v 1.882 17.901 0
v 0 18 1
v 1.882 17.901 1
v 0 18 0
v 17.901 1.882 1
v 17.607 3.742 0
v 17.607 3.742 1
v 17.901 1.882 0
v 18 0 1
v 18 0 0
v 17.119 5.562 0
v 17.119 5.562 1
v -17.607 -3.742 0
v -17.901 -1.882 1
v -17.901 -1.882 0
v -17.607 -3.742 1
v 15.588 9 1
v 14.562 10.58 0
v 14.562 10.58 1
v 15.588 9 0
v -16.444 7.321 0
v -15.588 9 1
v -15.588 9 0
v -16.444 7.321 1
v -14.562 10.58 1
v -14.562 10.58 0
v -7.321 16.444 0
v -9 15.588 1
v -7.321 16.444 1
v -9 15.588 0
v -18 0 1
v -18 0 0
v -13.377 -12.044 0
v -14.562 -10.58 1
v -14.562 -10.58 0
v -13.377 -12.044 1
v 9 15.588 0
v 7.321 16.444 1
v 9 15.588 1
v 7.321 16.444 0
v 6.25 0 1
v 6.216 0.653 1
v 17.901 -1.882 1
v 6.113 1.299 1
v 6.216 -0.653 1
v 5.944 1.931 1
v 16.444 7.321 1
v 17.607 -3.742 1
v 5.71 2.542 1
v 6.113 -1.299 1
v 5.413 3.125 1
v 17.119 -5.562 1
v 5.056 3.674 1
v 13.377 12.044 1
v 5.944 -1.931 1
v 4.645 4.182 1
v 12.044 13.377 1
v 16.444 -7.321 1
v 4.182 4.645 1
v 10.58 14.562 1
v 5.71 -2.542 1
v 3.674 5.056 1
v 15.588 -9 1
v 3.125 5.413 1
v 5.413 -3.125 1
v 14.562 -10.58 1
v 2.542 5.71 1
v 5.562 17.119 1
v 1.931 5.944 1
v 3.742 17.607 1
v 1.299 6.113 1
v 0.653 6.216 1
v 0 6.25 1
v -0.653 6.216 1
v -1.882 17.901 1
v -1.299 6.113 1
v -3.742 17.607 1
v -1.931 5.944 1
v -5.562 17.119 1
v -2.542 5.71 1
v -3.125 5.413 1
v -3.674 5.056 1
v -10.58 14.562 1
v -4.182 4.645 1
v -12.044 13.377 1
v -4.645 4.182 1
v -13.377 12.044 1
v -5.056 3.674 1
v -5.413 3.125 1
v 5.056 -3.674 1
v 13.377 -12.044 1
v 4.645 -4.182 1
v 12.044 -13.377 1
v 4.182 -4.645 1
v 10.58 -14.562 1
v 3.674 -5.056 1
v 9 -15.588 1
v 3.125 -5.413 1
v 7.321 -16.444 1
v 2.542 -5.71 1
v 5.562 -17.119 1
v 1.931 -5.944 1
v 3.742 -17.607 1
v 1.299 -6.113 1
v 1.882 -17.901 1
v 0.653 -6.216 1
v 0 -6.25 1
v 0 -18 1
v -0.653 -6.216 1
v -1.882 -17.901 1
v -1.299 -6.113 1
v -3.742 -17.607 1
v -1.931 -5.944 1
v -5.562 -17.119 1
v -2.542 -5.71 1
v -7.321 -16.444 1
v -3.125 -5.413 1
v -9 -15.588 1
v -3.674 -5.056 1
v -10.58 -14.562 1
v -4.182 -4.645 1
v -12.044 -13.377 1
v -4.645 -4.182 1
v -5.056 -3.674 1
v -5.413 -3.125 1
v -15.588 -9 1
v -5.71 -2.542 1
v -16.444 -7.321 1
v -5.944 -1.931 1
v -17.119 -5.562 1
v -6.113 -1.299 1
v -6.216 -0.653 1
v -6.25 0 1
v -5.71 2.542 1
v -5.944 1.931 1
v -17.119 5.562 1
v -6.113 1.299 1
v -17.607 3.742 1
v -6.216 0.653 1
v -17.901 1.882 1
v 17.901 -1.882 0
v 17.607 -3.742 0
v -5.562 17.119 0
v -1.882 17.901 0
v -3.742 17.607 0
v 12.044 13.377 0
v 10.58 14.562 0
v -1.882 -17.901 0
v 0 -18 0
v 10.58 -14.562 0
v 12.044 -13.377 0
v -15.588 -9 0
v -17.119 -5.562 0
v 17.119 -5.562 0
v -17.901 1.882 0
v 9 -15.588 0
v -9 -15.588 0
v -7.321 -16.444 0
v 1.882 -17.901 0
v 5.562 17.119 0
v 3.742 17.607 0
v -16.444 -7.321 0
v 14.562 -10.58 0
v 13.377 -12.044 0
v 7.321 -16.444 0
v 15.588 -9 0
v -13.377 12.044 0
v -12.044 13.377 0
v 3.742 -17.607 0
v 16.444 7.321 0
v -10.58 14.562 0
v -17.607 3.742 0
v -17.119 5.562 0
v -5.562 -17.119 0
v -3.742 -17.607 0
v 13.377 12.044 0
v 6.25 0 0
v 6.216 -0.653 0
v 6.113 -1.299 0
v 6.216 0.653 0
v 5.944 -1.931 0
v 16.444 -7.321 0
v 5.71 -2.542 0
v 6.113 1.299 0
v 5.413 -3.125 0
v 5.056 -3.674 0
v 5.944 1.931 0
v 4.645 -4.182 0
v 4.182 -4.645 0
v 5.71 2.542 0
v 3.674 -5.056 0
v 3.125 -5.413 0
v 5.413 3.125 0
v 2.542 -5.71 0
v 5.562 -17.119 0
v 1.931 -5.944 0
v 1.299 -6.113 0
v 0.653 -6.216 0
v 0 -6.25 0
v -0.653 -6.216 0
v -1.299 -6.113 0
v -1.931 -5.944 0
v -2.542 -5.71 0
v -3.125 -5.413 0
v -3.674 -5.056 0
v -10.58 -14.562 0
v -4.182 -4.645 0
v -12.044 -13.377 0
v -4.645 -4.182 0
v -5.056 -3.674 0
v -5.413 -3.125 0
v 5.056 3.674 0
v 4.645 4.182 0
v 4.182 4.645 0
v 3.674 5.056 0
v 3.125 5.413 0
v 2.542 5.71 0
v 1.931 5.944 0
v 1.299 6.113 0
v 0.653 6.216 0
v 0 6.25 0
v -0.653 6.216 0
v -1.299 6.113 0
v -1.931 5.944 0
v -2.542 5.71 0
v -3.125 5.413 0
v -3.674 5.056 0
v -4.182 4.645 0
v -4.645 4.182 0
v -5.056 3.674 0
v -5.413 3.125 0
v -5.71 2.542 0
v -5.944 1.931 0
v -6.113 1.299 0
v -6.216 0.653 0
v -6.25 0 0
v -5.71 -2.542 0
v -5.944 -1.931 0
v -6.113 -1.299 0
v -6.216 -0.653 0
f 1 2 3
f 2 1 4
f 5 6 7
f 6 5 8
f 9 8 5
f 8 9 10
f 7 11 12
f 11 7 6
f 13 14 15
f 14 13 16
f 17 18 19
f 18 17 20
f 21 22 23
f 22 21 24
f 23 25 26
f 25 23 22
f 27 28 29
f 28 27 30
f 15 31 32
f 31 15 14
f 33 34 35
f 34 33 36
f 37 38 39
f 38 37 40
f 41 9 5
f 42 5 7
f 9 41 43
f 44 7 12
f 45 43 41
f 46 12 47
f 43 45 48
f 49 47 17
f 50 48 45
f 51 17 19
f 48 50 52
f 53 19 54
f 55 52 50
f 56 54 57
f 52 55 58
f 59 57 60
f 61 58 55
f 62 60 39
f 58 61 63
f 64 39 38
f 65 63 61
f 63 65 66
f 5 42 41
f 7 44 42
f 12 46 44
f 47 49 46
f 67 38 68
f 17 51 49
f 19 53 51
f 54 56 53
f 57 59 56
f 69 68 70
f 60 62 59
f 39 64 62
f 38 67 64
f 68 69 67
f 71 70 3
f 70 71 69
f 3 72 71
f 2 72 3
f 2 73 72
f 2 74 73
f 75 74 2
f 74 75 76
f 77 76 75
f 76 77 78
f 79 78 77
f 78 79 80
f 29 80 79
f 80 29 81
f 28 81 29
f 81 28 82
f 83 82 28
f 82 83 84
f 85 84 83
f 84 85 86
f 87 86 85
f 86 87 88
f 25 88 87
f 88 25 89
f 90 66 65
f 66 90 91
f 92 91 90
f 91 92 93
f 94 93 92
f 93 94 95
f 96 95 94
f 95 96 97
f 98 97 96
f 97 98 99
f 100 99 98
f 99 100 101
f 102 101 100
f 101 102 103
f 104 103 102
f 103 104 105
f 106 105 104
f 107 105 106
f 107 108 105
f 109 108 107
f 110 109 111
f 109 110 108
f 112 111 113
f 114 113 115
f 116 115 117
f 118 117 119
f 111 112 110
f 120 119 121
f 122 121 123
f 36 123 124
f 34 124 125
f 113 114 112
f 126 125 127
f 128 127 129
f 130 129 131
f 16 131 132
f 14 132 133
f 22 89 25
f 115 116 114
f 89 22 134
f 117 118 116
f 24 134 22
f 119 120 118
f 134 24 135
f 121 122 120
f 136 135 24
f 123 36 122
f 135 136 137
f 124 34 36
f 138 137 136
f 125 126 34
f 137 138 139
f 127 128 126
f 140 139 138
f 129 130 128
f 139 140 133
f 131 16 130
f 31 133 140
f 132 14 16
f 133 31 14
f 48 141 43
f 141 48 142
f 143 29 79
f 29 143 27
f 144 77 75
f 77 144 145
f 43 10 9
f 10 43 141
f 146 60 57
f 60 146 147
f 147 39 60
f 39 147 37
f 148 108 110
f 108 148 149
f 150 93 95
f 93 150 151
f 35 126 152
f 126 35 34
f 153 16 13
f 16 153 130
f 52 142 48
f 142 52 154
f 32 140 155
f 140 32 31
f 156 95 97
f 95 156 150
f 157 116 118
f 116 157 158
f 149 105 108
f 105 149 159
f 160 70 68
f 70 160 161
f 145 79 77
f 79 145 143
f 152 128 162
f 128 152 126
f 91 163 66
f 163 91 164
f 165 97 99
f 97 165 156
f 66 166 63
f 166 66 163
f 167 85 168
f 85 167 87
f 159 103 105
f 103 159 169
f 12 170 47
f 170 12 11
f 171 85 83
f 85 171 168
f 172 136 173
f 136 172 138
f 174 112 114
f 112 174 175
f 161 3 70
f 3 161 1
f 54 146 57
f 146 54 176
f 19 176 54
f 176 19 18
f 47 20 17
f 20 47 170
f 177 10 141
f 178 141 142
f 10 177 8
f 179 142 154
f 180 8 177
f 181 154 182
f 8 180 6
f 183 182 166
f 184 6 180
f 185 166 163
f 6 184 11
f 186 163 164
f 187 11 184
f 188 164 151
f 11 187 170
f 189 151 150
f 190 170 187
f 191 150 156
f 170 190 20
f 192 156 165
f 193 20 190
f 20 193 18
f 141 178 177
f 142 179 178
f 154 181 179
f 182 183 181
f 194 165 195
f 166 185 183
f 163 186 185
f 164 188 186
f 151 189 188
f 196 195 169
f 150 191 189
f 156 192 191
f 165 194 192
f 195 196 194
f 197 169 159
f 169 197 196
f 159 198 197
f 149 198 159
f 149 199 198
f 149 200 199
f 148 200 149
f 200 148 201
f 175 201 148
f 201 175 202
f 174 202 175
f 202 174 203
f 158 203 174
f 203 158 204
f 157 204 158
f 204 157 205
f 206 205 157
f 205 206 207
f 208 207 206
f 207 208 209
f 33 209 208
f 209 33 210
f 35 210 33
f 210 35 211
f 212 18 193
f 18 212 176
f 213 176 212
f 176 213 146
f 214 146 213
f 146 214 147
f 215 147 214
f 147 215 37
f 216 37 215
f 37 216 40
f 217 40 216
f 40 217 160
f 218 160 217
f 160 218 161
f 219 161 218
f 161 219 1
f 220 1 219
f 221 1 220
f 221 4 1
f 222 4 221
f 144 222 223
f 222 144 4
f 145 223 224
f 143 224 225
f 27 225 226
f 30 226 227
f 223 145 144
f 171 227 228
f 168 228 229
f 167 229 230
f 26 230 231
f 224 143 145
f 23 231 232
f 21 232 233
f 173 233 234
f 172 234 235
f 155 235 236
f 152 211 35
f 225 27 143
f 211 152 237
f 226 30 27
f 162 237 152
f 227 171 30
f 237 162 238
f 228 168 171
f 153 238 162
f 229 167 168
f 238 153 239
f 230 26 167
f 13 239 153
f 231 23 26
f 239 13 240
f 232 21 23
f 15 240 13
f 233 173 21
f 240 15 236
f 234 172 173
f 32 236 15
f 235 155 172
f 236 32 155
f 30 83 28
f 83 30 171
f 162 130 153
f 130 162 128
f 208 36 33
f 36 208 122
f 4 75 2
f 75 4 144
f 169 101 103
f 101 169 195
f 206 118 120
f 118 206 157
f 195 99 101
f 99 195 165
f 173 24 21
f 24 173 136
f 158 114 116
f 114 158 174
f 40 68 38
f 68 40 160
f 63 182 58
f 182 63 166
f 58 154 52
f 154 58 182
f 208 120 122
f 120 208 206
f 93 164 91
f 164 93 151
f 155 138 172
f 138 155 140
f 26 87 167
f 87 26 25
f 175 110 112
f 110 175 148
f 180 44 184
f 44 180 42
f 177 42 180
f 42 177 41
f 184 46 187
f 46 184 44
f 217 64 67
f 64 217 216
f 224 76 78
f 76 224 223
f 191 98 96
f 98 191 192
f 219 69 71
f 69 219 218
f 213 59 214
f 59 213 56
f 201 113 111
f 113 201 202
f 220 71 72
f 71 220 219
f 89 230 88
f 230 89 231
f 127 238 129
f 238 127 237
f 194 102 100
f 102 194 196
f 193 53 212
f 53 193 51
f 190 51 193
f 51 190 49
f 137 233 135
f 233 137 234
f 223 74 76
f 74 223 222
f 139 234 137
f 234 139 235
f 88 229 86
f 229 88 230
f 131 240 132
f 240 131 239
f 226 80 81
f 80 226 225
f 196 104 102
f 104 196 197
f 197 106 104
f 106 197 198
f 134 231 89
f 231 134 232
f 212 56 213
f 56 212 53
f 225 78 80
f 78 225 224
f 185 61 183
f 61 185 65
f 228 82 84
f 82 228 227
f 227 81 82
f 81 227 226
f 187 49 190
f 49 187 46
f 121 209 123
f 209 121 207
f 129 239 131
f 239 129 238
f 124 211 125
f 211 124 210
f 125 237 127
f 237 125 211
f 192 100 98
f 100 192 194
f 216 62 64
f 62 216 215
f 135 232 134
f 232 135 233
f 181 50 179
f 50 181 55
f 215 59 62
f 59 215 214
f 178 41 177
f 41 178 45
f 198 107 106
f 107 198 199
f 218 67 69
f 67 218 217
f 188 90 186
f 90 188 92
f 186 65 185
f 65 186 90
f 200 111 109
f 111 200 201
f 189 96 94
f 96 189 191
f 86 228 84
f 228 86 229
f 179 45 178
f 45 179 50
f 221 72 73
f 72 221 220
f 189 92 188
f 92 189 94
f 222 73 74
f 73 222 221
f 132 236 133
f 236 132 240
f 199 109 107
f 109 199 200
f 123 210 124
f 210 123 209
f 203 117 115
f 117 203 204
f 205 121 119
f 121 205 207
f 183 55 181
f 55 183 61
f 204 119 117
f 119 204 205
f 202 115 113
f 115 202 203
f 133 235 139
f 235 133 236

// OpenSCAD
// file: _params.scad
// =========================================================================
// 공유 파라미터 (모든 개별 부품 파일에서 include)
// 메인 어셈블리: cup_z_x_catrage_frame_water_mic_anti_3030.scad 에서 추출
// 프레임: 600 × 420 × 700mm (3030 프로파일, Y=0 대칭)
// =========================================================================

$fn = 60;  // 부품 출력용 고해상도
GLOBAL_TOLERANCE = 0.2;

// --- [1] 하부 기성품 및 원통 파라미터 ---
X_RAIL_LEN = 290.0;
X_BLOCK_W = 30.0; X_BLOCK_L = 32.0;   // 신규 X슬라이더 블록 (폭 30mm × 길이 32mm)
X_PITCH_X = 20.0; X_PITCH_Y = 20.0;   // 체결 홀 피치 (20 × 20mm, M3 나사탭 4개)
X_RAIL_W = 30.0;  X_RAIL_H = 20.0;   // 레일 폭 30mm (레일 바닥~블록 윗면 높이 29mm 반영)
X_TOTAL_H = 29.0;                    // 레일 바닥에서 슬라이더 블록 윗면까지의 높이

MOTOR_W = 42.0;      MOTOR_PITCH = 31.0; MOTOR_HOLE_D = 3.5;    
MOTOR_BOSS_D = 22.0; MOTOR_BOSS_H = 2.0; SCREW_D = 8.0;         
MOT_BODY_L = 41.0;   SHAFT_L = 24.0;     // 실측 NEMA17 몸통 41mm / 축 돌출 24mm

CUP_ID = 99.5;  CUP_WALL = 5.0; CUP_OD = 110.0;     // 아크릴 원통 OD110/ID100
CUP_H = 180.0;   CAGE_H = 60.0;  FLOOR_H = 10.0; PISTON_H = 20.0;     

LIP_D = 30.0;    LIP_H = 5.0;    LEAK_DRAIN_D = 4.0;    
GUIDE_PIPE_D = 8.0; BUSHING_OD = 12.0; BUSHING_H = 8.0;       
DRAIN_RADIUS = 35.0; DRAIN_D = 8.0;        

Y_OFFSET = 85.0; BRKT_H = 12.0; BRKT_D = 122.0; BRKT_ID = 62.0; Z_MOUNT_PCD = 86.0;   

// --- [2] 아크릴 파이프 및 상부 카트리지 ---
ACRYL_ID = 100.0; ACRYL_T = 5.0; ACRYL_OD = ACRYL_ID + (ACRYL_T * 2);  // OD110 (아크릴집 106 재고없음 → 컵과 동일 규격)

REVOLVER_PCD = 240.0;     // 인접 카트리지 웹 9.8mm 확보 (OD110 대응, 230→240)
CARTRIDGE_OD = REVOLVER_PCD + ACRYL_OD + 8; 
TOP_PLATE_H = 15.0;       // 아크릴 15T 통판 (보스홀 단 깊이 10mm)

HUB_D = 60.0;            
SHAFT_D = 12.0;          
HUB_WALL = 4.0;          
HUB_H = 15.0;             // 아크릴 5T × 3장 적층 — 파이프 130mm 대응
POCKET_DEPTH = 5.0;
MID_HUB_Z = 63.5;          // 중단 허브 하면 Z (벨트 중심 Z=71.0mm 정렬, 풀리 상단 Z=75.0mm = 축상단-1mm)
UPPER_HUB_Z = 135.0;       // 상단 허브 하면 Z (전체 135+15=150 유지)
BOSS_OD = 35.0;
BOSS_H = 11.0;             // 보스11 + 와셔1 = 12, 리세스10 → 허브 2mm 공중

// --- [3] GT2 벨트 구동 시스템 ---
GT2_PITCH     = 2.0;
GT2_BELT_W    = 6.0;
BIG_PULLEY_TEETH = 566;
BIG_PULLEY_PD = BIG_PULLEY_TEETH * GT2_PITCH / PI;
BIG_PULLEY_OD = BIG_PULLEY_PD + 1.0;
SMALL_PULLEY_TEETH = 20;
SMALL_PULLEY_PD = SMALL_PULLEY_TEETH * GT2_PITCH / PI;
SMALL_PULLEY_OD = SMALL_PULLEY_PD + 1.0;

BELT_MOTOR_X = -300;
BELT_MOTOR_Y = -155.5;
BRKT_MOTOR_H = 25.0;
BRKT_MOTOR_W = 45.0;        // 브래킷 폭 45mm (프로파일 간섭 회피 복원)
SLOT_LEN = 10.0;
FLAG_W = 15.0;  FLAG_H = 8.0;  FLAG_T = 1.5;

X_POS_MEASURE = 170.0;   // 측정 브래킷 X좌표 (X_M~X_R 정중앙, X대칭)

// --- [4] 3030 프레임 경계 (600×430×700mm) ---
PF = 30;             // 3030 알루미늄 프로파일
WASHER_T = 1.0;     

X_L = -320;
X_M = 60;
X_R = 250;
Y_F = -210;          // 전방 (대칭: -210+30=-180, Y=0 중심)
Y_B = 180;           // 후방 (대칭: 180+30=210, Y=0 중심) — 메인파일과 동기화

Z_BOT = -480;
Z_RAIL = -322;
Z_MID = -TOP_PLATE_H - PF;
Z_TOP = 220;

SUPPORT_PILLAR_H = Z_TOP - PF;

SHAFT_SQ = 20;       // 2020 사각 회전축

// 사각 축 홀 크기
SQ = SHAFT_SQ + GLOBAL_TOLERANCE;  // 20.2mm

// --- 리볼버/컵 축 정렬 (보스홀=판 중심에 리볼버 정렬) ---
REVOLVER_CX = (X_L + X_M + PF)/2;        // 판 중심 = 보스홀 = 리볼버 회전축 (-115)
DROP_X      = REVOLVER_CX + REVOLVER_PCD/2;  // 링 드롭 / 컵 적재 축 (+5)

FLANGE_Z = 52.0;       // 모터 전면 안착 높이 (Z=52mm -> 축 상단 Z=76mm, 풀리 결합)

// --- [5] 모터 체결홀 (이미 제작 완료된 15T 상판 원본 도면 수치 100% 유지) ---
MOTOR_BOLT_PITCH     = 25.0;      // Y피치 (Y = ±12.5mm)
MOTOR_BOLT_X_NOMINAL = X_L + 55;  // 1열: 상판 좌단 55 (모터축 기준 +35mm = X=-265mm)
MOTOR_BOLT_X_SHIFT   = X_L + 40;  // 2열: 상판 좌단 40 (모터축 기준 +20mm = X=-280mm)

// 모터 마운트 볼트 카운터보어 (단볼트용 — 브래킷 두께 25 중 깊게 파냄)
MOTOR_CB_D     = 6.5;            // M3 캡볼트 머리 클리어런스
MOTOR_CB_DEPTH = 19;             // 카운터보어 깊이 (잔여 통과 6mm → M3×10 단볼트)
// main file
// =========================================================================
// [구매] 테플론(PTFE) 와셔
// 구매: PTFE 와셔 OD36 × ID(SHAFT_D+0.5) × T1mm
// 하단 허브 보스 아래, 상판 단 바닥에 매립 (저마찰 베어링)
// 보스(9.3) + 와셔(1) = 10.3mm → 단(10mm)에 0.3mm 프리로드
// =========================================================================
include <_params.scad>

color([0.9, 0.9, 0.9]) difference() {
    cylinder(d=36, h=WASHER_T);
    translate([0, 0, -0.5]) cylinder(d=SHAFT_D + 0.5, h=WASHER_T + 1);
}
